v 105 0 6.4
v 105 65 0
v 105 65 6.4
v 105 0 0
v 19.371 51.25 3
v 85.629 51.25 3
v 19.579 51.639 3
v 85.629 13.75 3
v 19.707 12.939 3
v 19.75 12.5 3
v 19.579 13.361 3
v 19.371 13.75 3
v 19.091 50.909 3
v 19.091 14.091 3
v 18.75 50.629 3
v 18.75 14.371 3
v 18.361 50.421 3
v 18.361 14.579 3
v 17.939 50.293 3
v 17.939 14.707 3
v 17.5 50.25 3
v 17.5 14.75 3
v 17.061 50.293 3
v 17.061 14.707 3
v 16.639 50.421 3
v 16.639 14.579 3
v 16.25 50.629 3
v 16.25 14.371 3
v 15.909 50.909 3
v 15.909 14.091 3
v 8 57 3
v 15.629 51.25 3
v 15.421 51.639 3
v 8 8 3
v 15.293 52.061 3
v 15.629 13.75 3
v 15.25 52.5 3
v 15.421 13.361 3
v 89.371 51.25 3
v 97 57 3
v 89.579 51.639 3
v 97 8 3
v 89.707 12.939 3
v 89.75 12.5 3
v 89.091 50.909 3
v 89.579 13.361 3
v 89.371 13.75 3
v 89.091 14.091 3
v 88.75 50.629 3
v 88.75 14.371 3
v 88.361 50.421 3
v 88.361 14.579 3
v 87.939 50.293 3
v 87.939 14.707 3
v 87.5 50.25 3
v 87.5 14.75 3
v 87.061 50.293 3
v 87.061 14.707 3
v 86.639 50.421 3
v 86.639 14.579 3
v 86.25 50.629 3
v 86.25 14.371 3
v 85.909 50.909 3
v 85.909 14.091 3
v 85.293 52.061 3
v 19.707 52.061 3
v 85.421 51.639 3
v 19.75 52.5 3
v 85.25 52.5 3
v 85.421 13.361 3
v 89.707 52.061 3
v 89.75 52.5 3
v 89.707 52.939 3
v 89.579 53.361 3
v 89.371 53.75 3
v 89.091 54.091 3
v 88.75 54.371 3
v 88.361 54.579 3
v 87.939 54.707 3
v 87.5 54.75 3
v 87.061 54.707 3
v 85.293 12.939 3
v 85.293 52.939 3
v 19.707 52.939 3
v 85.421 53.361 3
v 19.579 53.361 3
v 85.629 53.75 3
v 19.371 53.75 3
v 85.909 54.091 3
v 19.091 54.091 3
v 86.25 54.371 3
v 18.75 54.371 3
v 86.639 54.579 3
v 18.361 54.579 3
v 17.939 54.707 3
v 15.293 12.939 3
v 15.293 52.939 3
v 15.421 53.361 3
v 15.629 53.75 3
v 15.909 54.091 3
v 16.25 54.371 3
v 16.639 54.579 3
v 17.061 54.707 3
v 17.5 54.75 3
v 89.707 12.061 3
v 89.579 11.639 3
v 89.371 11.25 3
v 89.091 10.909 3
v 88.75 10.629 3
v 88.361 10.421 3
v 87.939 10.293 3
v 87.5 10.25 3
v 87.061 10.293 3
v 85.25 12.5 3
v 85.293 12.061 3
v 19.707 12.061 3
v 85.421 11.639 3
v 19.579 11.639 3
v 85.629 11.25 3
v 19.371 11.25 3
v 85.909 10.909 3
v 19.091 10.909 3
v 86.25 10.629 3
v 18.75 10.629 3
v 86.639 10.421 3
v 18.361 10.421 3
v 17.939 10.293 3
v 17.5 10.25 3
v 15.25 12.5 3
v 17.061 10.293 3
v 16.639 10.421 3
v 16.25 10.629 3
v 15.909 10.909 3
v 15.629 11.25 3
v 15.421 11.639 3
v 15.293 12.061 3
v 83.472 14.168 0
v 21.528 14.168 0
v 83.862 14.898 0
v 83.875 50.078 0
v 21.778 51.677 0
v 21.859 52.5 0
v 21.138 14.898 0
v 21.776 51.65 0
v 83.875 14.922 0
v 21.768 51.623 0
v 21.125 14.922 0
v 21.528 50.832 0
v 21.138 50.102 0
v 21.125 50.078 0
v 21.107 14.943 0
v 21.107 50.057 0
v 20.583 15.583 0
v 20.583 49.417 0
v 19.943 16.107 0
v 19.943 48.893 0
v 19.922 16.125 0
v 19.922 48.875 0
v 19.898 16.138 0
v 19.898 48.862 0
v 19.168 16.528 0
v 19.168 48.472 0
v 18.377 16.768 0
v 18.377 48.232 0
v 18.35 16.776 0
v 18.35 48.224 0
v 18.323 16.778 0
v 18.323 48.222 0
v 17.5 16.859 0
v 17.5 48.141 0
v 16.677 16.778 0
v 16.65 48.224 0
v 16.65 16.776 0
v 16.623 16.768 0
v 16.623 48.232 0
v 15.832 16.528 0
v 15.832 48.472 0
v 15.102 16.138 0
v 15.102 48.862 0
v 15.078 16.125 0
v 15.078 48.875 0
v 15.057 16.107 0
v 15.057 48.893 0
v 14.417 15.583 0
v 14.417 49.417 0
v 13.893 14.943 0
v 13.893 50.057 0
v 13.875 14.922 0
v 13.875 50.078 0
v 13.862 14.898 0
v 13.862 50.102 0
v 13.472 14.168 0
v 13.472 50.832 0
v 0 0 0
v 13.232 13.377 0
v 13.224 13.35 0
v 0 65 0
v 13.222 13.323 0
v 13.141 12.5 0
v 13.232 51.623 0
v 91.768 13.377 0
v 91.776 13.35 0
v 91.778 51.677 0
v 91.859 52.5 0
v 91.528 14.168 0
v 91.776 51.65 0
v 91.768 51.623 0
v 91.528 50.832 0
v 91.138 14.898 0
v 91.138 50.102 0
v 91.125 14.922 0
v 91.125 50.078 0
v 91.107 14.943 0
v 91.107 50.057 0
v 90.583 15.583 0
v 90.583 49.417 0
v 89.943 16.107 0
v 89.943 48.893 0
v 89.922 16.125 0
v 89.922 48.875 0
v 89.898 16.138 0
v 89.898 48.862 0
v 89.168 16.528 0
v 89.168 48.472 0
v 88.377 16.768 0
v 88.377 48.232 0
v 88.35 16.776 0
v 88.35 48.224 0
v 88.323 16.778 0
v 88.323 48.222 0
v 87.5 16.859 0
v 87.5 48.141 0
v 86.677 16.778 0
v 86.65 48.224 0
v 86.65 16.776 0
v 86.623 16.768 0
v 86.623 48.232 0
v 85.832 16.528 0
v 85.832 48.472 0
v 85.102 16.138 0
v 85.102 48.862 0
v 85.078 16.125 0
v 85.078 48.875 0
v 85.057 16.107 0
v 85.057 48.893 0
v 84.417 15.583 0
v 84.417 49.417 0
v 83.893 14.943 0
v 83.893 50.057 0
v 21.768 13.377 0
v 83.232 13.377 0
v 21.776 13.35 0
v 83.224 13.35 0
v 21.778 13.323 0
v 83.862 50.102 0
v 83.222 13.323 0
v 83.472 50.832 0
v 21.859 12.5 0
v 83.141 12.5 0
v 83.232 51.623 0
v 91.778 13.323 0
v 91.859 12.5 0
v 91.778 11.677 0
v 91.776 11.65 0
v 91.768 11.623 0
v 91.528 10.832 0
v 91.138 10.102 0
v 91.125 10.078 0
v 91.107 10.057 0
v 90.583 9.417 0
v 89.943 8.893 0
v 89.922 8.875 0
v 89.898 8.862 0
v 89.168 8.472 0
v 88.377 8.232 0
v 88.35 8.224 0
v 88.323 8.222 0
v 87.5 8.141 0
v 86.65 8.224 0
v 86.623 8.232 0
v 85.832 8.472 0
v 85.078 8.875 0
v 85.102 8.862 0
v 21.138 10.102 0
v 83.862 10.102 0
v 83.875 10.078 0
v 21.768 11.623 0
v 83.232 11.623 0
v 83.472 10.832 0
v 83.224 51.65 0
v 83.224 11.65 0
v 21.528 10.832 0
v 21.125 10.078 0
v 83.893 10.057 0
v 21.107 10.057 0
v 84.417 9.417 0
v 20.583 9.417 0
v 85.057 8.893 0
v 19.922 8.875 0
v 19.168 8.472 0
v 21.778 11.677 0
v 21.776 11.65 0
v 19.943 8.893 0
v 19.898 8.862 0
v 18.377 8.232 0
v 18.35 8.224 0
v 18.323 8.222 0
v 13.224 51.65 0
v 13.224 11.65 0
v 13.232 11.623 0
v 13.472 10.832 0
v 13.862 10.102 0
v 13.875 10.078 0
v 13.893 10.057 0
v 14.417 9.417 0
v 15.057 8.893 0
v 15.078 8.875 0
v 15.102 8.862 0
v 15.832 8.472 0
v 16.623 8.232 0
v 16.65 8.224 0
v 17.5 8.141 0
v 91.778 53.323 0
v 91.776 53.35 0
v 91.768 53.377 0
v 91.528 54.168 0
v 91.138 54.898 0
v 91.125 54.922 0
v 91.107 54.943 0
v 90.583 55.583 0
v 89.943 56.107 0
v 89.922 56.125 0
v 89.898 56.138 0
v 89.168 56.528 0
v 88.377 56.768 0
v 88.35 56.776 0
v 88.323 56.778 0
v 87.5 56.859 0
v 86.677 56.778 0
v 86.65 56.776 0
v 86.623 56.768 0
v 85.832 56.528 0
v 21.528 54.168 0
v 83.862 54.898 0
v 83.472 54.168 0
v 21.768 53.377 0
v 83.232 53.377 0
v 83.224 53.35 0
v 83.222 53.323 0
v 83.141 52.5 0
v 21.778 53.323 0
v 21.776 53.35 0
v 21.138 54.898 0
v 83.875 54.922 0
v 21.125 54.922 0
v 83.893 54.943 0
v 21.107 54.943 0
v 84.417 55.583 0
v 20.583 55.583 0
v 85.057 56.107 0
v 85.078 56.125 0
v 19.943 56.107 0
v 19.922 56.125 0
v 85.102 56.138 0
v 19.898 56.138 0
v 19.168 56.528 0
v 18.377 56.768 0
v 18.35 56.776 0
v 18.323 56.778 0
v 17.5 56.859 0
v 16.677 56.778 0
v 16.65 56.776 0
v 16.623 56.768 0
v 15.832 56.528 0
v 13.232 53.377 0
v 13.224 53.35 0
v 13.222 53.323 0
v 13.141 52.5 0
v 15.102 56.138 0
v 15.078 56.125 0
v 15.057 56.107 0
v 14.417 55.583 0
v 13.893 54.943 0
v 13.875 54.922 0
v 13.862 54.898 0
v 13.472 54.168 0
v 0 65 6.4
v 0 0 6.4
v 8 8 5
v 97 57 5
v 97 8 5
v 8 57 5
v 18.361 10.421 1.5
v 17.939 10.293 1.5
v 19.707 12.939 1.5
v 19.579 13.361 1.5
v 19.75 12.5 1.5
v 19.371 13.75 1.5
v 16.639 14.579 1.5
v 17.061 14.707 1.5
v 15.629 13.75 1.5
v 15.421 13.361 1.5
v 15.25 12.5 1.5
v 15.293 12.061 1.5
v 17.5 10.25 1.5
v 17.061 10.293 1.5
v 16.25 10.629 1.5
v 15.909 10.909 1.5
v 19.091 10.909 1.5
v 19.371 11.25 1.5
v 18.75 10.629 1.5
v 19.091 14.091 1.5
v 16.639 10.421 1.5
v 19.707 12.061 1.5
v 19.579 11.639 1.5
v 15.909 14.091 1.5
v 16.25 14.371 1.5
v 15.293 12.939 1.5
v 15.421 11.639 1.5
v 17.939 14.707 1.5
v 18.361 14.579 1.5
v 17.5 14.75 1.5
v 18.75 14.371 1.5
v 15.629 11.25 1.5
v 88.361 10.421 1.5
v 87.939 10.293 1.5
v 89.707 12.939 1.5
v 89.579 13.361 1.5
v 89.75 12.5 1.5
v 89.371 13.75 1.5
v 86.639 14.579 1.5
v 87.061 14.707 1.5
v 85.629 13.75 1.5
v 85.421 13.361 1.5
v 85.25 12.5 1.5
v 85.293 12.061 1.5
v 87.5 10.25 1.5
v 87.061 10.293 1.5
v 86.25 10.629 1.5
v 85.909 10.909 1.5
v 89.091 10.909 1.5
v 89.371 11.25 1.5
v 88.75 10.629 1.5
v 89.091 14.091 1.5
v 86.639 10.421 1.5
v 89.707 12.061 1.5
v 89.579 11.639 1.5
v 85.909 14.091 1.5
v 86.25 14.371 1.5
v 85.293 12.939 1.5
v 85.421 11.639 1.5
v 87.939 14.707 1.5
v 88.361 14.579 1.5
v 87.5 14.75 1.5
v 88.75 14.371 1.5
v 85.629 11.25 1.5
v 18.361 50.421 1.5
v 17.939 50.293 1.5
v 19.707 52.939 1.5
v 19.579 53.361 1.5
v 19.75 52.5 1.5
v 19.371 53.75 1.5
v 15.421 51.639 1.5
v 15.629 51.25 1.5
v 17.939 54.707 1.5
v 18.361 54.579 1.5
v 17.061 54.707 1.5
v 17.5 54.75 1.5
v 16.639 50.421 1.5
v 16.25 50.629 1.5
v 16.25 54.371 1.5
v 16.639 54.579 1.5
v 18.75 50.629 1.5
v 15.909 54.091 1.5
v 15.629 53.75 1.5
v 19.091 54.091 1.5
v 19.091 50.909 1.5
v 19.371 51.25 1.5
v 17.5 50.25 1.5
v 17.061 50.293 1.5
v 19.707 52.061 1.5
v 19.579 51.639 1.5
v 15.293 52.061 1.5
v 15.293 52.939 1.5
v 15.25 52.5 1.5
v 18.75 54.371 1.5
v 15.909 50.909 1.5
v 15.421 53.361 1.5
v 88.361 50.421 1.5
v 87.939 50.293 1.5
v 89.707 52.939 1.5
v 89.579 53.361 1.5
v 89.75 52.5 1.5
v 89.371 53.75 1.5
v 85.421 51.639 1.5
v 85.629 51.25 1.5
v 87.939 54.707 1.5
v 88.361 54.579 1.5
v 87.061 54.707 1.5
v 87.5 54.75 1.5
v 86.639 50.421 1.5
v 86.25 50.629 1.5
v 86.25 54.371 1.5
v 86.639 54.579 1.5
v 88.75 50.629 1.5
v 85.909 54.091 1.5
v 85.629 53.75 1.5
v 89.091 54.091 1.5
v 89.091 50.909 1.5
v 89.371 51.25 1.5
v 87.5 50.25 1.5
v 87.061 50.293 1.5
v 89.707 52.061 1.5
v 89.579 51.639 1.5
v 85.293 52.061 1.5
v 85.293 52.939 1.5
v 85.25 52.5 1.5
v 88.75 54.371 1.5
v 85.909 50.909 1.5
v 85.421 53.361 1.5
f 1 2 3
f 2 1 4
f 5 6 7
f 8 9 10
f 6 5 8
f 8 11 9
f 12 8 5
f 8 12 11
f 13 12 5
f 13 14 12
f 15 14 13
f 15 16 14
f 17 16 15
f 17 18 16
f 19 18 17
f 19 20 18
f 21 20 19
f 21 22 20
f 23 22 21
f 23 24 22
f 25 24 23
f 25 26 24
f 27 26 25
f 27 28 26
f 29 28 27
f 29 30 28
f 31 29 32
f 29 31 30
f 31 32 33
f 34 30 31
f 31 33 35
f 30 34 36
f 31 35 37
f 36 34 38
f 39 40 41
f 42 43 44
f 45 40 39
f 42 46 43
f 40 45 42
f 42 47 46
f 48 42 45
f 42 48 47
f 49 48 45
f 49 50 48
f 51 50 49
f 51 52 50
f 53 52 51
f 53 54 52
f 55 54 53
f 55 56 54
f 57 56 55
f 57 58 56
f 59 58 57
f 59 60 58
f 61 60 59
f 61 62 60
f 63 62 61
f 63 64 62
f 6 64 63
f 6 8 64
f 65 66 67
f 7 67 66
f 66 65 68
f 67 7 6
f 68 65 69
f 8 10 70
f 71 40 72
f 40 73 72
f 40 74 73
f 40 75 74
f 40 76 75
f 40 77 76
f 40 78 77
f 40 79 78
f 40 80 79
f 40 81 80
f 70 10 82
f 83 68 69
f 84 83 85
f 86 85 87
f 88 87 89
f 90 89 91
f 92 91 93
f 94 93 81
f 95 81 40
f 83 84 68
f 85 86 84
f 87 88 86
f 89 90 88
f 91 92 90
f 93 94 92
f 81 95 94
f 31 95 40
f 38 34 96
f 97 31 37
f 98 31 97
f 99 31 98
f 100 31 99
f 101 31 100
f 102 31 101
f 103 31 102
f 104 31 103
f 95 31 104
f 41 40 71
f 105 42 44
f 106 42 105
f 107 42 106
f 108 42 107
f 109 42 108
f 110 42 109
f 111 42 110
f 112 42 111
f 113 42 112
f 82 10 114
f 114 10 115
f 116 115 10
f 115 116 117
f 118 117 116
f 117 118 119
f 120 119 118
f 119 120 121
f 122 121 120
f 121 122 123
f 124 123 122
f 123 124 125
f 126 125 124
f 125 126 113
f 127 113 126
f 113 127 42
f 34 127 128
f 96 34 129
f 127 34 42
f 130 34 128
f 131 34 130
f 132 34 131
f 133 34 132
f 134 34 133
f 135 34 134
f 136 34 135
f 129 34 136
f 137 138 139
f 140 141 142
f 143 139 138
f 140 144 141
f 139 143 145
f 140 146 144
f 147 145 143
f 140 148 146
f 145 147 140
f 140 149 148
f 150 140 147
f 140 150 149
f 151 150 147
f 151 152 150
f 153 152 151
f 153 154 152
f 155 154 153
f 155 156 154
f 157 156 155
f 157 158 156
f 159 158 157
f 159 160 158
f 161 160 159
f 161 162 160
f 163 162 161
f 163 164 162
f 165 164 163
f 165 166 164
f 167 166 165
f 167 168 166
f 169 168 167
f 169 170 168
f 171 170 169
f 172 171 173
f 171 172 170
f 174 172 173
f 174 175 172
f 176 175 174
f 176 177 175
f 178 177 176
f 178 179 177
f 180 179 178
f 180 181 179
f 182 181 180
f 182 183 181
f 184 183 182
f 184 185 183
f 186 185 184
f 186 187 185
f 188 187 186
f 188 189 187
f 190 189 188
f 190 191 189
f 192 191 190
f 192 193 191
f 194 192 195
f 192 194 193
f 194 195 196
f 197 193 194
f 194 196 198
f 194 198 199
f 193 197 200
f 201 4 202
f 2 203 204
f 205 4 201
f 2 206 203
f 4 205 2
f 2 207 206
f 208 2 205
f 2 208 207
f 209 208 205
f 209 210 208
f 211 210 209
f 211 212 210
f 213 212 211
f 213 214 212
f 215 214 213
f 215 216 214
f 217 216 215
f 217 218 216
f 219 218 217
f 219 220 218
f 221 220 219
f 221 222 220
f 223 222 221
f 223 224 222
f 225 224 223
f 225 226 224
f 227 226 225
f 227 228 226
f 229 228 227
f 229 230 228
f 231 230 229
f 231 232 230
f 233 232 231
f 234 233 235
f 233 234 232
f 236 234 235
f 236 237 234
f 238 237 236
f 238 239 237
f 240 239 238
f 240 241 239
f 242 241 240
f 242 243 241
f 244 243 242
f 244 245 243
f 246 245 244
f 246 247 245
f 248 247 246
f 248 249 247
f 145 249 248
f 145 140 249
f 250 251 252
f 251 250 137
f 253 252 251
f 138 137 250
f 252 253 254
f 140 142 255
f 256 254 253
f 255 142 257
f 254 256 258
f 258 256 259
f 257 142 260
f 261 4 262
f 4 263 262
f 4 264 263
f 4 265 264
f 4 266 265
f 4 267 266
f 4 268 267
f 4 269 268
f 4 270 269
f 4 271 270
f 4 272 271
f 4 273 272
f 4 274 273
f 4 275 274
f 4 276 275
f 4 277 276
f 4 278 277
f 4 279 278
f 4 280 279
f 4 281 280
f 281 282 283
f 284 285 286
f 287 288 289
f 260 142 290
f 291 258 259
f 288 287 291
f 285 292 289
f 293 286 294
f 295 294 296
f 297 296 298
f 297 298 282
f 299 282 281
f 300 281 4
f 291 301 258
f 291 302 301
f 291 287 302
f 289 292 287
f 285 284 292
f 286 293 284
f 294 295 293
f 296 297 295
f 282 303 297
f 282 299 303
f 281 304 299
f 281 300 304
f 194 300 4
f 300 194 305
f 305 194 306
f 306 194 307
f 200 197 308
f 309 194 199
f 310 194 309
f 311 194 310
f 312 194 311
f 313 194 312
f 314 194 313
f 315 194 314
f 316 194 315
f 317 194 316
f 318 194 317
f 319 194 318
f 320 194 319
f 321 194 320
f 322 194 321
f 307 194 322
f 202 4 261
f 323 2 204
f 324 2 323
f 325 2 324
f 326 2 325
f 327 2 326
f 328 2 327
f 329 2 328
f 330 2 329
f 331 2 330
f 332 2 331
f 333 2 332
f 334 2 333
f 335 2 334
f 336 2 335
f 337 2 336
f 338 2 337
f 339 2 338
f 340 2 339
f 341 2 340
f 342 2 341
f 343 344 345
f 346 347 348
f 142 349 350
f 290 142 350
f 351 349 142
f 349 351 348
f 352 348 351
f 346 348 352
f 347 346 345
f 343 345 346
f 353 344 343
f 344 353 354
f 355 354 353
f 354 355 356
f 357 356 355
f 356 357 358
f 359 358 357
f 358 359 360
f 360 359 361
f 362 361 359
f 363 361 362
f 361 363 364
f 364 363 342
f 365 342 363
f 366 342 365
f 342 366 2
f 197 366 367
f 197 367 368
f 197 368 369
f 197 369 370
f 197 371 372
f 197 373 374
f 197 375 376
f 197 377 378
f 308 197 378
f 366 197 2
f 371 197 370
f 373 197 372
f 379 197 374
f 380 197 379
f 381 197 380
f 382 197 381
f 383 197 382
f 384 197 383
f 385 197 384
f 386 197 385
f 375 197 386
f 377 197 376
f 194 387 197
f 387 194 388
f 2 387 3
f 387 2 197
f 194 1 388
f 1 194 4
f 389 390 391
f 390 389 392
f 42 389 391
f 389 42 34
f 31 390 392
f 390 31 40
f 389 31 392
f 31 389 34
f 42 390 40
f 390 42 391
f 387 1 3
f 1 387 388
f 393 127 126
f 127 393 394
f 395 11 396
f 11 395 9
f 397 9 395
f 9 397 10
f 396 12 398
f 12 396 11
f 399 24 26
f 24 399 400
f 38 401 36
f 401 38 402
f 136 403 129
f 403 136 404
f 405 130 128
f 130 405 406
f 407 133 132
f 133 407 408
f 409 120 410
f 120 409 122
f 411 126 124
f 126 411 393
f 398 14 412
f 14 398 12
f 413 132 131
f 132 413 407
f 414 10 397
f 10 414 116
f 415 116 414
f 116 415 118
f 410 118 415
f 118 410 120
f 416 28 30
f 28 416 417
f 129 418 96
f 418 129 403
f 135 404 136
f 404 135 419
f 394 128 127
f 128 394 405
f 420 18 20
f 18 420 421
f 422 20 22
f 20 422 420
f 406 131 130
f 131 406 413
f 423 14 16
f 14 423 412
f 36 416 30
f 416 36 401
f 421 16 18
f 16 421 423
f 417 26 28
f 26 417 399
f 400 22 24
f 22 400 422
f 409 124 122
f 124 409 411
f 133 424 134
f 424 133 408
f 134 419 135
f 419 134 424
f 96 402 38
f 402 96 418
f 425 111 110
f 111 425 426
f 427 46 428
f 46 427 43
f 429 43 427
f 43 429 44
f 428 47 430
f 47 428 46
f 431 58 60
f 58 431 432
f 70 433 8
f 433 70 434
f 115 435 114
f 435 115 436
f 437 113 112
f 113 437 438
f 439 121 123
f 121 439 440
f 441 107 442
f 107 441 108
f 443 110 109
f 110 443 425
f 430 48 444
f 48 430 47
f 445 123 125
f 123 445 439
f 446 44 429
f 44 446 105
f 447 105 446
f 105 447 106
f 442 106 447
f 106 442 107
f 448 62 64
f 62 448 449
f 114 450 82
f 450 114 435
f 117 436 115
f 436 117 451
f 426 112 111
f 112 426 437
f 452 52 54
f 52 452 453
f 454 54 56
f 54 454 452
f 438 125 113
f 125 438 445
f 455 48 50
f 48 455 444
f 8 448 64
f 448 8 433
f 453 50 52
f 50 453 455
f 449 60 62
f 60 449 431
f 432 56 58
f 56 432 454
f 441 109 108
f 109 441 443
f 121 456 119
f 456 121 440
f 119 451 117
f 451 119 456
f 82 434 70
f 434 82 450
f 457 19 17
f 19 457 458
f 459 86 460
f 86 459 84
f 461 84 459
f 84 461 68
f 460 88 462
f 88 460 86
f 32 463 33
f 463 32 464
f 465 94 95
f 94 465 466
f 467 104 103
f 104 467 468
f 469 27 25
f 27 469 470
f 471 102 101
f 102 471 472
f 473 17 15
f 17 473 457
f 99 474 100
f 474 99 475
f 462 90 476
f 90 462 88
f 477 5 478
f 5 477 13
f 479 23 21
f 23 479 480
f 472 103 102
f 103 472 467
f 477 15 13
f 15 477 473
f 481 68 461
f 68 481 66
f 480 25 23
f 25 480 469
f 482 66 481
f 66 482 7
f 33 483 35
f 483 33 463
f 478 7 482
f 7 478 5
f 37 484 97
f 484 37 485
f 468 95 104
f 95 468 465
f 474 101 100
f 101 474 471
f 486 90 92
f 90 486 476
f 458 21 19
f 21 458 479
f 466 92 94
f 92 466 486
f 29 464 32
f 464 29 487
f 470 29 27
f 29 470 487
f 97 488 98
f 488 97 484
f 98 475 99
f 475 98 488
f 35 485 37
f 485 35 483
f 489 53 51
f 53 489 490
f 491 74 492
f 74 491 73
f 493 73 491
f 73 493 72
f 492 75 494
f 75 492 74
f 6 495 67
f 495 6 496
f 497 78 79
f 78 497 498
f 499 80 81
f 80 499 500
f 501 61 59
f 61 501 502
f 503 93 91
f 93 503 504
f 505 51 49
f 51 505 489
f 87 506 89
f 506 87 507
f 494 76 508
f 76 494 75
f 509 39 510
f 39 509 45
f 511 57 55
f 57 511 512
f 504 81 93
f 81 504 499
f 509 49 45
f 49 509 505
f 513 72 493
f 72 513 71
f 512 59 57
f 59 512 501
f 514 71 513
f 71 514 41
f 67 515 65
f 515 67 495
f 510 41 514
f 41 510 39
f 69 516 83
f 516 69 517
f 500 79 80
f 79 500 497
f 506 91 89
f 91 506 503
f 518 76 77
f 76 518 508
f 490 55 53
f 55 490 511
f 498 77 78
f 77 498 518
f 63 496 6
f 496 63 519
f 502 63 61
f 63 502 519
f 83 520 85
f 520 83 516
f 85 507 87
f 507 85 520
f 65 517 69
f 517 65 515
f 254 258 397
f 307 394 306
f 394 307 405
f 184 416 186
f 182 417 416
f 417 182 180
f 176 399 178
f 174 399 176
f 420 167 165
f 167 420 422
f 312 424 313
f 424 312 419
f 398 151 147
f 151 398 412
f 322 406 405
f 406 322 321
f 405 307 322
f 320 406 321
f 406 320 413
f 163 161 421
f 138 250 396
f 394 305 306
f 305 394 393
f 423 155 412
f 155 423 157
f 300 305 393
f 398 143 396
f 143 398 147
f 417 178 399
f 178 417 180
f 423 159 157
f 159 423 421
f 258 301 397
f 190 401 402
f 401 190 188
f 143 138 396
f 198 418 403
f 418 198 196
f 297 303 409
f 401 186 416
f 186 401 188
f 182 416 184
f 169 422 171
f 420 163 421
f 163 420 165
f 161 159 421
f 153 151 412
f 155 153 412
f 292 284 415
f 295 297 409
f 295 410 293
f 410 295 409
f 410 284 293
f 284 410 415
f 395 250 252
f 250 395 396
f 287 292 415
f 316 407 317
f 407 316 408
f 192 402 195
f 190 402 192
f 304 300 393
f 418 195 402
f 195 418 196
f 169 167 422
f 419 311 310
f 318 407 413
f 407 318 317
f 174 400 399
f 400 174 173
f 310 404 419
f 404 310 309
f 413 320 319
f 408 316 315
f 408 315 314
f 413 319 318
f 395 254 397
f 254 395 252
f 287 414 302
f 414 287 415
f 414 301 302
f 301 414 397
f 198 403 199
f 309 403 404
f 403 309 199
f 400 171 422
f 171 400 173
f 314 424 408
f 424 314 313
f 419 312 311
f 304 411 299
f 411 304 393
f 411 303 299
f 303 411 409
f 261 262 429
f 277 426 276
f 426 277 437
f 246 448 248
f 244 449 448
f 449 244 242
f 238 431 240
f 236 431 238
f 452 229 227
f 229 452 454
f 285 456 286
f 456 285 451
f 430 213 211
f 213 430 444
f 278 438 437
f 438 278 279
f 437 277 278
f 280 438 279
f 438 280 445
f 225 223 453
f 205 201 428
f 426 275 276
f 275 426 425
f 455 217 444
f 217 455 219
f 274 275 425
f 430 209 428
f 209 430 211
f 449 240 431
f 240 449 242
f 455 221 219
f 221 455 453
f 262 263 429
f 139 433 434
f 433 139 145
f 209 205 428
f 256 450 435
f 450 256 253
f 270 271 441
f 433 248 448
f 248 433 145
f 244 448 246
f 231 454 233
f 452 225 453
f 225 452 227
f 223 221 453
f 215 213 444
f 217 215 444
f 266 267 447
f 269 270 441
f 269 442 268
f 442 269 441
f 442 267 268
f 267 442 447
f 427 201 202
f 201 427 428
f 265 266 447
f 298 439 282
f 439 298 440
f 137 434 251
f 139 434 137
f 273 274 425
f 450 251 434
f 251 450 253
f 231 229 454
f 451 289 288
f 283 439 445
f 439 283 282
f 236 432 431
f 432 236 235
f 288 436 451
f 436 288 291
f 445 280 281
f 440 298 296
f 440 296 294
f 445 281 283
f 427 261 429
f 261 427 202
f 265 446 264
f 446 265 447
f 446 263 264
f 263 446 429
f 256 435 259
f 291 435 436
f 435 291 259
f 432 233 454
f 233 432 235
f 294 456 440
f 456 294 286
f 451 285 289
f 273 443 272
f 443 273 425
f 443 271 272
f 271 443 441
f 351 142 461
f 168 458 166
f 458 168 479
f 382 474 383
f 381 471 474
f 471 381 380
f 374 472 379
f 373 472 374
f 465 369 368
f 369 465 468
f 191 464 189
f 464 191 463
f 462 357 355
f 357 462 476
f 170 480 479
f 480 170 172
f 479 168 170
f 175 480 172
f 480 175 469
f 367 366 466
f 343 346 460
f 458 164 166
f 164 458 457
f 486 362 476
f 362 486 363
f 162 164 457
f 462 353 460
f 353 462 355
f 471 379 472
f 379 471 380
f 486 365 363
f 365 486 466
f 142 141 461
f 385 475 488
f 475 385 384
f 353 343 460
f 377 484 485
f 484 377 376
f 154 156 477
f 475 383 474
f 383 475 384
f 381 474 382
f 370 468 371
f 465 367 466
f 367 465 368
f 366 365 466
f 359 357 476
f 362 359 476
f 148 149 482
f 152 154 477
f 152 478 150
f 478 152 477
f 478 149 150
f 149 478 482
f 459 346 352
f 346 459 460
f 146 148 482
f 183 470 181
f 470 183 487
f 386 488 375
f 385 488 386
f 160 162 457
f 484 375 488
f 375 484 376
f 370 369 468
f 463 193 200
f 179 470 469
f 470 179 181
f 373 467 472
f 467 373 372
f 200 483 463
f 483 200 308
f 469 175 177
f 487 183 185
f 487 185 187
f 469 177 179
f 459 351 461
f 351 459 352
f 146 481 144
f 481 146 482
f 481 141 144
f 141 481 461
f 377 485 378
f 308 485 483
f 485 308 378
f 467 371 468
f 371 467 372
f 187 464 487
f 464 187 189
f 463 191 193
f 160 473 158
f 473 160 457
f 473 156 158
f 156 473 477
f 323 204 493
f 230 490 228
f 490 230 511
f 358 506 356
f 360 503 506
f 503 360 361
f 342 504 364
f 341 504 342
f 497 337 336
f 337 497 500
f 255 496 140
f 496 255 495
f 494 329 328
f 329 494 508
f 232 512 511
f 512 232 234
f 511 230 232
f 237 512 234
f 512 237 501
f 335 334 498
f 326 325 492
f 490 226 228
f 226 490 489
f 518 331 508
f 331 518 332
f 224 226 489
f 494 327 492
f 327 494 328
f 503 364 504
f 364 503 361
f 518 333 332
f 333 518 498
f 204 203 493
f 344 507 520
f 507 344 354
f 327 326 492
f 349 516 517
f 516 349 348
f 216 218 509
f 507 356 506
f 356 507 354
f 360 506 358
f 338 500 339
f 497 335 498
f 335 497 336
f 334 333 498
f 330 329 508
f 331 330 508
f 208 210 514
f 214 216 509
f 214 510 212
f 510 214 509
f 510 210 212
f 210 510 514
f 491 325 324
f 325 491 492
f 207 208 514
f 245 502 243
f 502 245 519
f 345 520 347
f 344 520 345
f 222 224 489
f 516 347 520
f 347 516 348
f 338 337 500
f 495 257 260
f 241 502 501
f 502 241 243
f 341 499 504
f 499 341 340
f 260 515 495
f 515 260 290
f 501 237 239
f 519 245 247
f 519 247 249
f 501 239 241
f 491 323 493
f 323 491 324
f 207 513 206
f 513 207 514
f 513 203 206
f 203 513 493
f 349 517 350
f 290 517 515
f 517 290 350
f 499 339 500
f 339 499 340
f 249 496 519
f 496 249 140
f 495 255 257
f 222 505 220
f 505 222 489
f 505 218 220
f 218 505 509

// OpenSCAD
// Rain the101 Router Wall Mount - Sandwich Design
// Two plates with spacer for maximum rigidity

/* [Plate Dimensions] */
// Width of bracket (inner clip spacing is 110mm)
bracket_width = 105;  // mm

// Height of bracket (doesn't need full 130mm, half is fine)
bracket_height = 65;  // mm

/* [Front Plate - slides under clips] */
// Thickness of front plate (must fit under clips - 1.5mm gap)
front_plate_thickness = 1.4;  // mm

/* [Back Plate - mounts to wall] */
// Thickness of back plate
back_plate_thickness = 3;  // mm

/* [Spacer] */
// Gap between plates (creates the C-channel)
spacer_gap = 2;  // mm

// Spacer wall thickness
spacer_wall = 8;  // mm

/* [Screw Holes] */
// Screw hole diameter (for #8 screws, use ~4.5mm)
screw_hole_diameter = 4.5;  // mm

// Horizontal spacing between screw holes (center to center)
screw_spacing_h = 70;  // mm

// Vertical spacing between screw holes (center to center)
screw_spacing_v = 40;  // mm

// Countersink depth
countersink_depth = 1.5;  // mm

// Countersink diameter
countersink_diameter = 9;  // mm

/* [Rendering] */
$fn = 32;  // Circle smoothness

// ============================================
// Calculated values
// ============================================
total_thickness = back_plate_thickness + spacer_gap + front_plate_thickness;

// ============================================
// Main Module - Sandwich Bracket
// ============================================

module sandwich_bracket() {
    difference() {
        union() {
            // Back plate (against wall)
            cube([bracket_width, bracket_height, back_plate_thickness]);

            // Spacer walls (top and bottom edges, creating C-channel)
            // Bottom spacer
            translate([0, 0, back_plate_thickness])
                cube([bracket_width, spacer_wall, spacer_gap]);

            // Top spacer
            translate([0, bracket_height - spacer_wall, back_plate_thickness])
                cube([bracket_width, spacer_wall, spacer_gap]);

            // Left spacer (connects top and bottom)
            translate([0, 0, back_plate_thickness])
                cube([spacer_wall, bracket_height, spacer_gap]);

            // Right spacer (connects top and bottom)
            translate([bracket_width - spacer_wall, 0, back_plate_thickness])
                cube([spacer_wall, bracket_height, spacer_gap]);

            // Front plate (slides under clips)
            translate([0, 0, back_plate_thickness + spacer_gap])
                cube([bracket_width, bracket_height, front_plate_thickness]);
        }

        // Screw holes through back plate (4 holes in rectangle pattern)
        // Bottom left
        translate([bracket_width/2 - screw_spacing_h/2, bracket_height/2 - screw_spacing_v/2, -0.1])
            cylinder(h = back_plate_thickness + 0.2, d = screw_hole_diameter);

        // Bottom right
        translate([bracket_width/2 + screw_spacing_h/2, bracket_height/2 - screw_spacing_v/2, -0.1])
            cylinder(h = back_plate_thickness + 0.2, d = screw_hole_diameter);

        // Top left
        translate([bracket_width/2 - screw_spacing_h/2, bracket_height/2 + screw_spacing_v/2, -0.1])
            cylinder(h = back_plate_thickness + 0.2, d = screw_hole_diameter);

        // Top right
        translate([bracket_width/2 + screw_spacing_h/2, bracket_height/2 + screw_spacing_v/2, -0.1])
            cylinder(h = back_plate_thickness + 0.2, d = screw_hole_diameter);

        // Countersinks (from back/wall side)
        translate([bracket_width/2 - screw_spacing_h/2, bracket_height/2 - screw_spacing_v/2, -0.1])
            cylinder(h = countersink_depth + 0.1, d1 = countersink_diameter, d2 = screw_hole_diameter);

        translate([bracket_width/2 + screw_spacing_h/2, bracket_height/2 - screw_spacing_v/2, -0.1])
            cylinder(h = countersink_depth + 0.1, d1 = countersink_diameter, d2 = screw_hole_diameter);

        translate([bracket_width/2 - screw_spacing_h/2, bracket_height/2 + screw_spacing_v/2, -0.1])
            cylinder(h = countersink_depth + 0.1, d1 = countersink_diameter, d2 = screw_hole_diameter);

        translate([bracket_width/2 + screw_spacing_h/2, bracket_height/2 + screw_spacing_v/2, -0.1])
            cylinder(h = countersink_depth + 0.1, d1 = countersink_diameter, d2 = screw_hole_diameter);
    }
}

// Render the bracket
sandwich_bracket();

// ============================================
// Info
// ============================================
echo("=== Rain the101 Wall Mount - Sandwich Design ===");
echo(str("Bracket size: ", bracket_width, "mm x ", bracket_height, "mm"));
echo(str("Total thickness: ", total_thickness, "mm"));
echo(str("  - Back plate: ", back_plate_thickness, "mm"));
echo(str("  - Spacer gap: ", spacer_gap, "mm"));
echo(str("  - Front plate: ", front_plate_thickness, "mm"));
echo(str("Screw pattern: ", screw_spacing_h, "mm x ", screw_spacing_v, "mm"));
